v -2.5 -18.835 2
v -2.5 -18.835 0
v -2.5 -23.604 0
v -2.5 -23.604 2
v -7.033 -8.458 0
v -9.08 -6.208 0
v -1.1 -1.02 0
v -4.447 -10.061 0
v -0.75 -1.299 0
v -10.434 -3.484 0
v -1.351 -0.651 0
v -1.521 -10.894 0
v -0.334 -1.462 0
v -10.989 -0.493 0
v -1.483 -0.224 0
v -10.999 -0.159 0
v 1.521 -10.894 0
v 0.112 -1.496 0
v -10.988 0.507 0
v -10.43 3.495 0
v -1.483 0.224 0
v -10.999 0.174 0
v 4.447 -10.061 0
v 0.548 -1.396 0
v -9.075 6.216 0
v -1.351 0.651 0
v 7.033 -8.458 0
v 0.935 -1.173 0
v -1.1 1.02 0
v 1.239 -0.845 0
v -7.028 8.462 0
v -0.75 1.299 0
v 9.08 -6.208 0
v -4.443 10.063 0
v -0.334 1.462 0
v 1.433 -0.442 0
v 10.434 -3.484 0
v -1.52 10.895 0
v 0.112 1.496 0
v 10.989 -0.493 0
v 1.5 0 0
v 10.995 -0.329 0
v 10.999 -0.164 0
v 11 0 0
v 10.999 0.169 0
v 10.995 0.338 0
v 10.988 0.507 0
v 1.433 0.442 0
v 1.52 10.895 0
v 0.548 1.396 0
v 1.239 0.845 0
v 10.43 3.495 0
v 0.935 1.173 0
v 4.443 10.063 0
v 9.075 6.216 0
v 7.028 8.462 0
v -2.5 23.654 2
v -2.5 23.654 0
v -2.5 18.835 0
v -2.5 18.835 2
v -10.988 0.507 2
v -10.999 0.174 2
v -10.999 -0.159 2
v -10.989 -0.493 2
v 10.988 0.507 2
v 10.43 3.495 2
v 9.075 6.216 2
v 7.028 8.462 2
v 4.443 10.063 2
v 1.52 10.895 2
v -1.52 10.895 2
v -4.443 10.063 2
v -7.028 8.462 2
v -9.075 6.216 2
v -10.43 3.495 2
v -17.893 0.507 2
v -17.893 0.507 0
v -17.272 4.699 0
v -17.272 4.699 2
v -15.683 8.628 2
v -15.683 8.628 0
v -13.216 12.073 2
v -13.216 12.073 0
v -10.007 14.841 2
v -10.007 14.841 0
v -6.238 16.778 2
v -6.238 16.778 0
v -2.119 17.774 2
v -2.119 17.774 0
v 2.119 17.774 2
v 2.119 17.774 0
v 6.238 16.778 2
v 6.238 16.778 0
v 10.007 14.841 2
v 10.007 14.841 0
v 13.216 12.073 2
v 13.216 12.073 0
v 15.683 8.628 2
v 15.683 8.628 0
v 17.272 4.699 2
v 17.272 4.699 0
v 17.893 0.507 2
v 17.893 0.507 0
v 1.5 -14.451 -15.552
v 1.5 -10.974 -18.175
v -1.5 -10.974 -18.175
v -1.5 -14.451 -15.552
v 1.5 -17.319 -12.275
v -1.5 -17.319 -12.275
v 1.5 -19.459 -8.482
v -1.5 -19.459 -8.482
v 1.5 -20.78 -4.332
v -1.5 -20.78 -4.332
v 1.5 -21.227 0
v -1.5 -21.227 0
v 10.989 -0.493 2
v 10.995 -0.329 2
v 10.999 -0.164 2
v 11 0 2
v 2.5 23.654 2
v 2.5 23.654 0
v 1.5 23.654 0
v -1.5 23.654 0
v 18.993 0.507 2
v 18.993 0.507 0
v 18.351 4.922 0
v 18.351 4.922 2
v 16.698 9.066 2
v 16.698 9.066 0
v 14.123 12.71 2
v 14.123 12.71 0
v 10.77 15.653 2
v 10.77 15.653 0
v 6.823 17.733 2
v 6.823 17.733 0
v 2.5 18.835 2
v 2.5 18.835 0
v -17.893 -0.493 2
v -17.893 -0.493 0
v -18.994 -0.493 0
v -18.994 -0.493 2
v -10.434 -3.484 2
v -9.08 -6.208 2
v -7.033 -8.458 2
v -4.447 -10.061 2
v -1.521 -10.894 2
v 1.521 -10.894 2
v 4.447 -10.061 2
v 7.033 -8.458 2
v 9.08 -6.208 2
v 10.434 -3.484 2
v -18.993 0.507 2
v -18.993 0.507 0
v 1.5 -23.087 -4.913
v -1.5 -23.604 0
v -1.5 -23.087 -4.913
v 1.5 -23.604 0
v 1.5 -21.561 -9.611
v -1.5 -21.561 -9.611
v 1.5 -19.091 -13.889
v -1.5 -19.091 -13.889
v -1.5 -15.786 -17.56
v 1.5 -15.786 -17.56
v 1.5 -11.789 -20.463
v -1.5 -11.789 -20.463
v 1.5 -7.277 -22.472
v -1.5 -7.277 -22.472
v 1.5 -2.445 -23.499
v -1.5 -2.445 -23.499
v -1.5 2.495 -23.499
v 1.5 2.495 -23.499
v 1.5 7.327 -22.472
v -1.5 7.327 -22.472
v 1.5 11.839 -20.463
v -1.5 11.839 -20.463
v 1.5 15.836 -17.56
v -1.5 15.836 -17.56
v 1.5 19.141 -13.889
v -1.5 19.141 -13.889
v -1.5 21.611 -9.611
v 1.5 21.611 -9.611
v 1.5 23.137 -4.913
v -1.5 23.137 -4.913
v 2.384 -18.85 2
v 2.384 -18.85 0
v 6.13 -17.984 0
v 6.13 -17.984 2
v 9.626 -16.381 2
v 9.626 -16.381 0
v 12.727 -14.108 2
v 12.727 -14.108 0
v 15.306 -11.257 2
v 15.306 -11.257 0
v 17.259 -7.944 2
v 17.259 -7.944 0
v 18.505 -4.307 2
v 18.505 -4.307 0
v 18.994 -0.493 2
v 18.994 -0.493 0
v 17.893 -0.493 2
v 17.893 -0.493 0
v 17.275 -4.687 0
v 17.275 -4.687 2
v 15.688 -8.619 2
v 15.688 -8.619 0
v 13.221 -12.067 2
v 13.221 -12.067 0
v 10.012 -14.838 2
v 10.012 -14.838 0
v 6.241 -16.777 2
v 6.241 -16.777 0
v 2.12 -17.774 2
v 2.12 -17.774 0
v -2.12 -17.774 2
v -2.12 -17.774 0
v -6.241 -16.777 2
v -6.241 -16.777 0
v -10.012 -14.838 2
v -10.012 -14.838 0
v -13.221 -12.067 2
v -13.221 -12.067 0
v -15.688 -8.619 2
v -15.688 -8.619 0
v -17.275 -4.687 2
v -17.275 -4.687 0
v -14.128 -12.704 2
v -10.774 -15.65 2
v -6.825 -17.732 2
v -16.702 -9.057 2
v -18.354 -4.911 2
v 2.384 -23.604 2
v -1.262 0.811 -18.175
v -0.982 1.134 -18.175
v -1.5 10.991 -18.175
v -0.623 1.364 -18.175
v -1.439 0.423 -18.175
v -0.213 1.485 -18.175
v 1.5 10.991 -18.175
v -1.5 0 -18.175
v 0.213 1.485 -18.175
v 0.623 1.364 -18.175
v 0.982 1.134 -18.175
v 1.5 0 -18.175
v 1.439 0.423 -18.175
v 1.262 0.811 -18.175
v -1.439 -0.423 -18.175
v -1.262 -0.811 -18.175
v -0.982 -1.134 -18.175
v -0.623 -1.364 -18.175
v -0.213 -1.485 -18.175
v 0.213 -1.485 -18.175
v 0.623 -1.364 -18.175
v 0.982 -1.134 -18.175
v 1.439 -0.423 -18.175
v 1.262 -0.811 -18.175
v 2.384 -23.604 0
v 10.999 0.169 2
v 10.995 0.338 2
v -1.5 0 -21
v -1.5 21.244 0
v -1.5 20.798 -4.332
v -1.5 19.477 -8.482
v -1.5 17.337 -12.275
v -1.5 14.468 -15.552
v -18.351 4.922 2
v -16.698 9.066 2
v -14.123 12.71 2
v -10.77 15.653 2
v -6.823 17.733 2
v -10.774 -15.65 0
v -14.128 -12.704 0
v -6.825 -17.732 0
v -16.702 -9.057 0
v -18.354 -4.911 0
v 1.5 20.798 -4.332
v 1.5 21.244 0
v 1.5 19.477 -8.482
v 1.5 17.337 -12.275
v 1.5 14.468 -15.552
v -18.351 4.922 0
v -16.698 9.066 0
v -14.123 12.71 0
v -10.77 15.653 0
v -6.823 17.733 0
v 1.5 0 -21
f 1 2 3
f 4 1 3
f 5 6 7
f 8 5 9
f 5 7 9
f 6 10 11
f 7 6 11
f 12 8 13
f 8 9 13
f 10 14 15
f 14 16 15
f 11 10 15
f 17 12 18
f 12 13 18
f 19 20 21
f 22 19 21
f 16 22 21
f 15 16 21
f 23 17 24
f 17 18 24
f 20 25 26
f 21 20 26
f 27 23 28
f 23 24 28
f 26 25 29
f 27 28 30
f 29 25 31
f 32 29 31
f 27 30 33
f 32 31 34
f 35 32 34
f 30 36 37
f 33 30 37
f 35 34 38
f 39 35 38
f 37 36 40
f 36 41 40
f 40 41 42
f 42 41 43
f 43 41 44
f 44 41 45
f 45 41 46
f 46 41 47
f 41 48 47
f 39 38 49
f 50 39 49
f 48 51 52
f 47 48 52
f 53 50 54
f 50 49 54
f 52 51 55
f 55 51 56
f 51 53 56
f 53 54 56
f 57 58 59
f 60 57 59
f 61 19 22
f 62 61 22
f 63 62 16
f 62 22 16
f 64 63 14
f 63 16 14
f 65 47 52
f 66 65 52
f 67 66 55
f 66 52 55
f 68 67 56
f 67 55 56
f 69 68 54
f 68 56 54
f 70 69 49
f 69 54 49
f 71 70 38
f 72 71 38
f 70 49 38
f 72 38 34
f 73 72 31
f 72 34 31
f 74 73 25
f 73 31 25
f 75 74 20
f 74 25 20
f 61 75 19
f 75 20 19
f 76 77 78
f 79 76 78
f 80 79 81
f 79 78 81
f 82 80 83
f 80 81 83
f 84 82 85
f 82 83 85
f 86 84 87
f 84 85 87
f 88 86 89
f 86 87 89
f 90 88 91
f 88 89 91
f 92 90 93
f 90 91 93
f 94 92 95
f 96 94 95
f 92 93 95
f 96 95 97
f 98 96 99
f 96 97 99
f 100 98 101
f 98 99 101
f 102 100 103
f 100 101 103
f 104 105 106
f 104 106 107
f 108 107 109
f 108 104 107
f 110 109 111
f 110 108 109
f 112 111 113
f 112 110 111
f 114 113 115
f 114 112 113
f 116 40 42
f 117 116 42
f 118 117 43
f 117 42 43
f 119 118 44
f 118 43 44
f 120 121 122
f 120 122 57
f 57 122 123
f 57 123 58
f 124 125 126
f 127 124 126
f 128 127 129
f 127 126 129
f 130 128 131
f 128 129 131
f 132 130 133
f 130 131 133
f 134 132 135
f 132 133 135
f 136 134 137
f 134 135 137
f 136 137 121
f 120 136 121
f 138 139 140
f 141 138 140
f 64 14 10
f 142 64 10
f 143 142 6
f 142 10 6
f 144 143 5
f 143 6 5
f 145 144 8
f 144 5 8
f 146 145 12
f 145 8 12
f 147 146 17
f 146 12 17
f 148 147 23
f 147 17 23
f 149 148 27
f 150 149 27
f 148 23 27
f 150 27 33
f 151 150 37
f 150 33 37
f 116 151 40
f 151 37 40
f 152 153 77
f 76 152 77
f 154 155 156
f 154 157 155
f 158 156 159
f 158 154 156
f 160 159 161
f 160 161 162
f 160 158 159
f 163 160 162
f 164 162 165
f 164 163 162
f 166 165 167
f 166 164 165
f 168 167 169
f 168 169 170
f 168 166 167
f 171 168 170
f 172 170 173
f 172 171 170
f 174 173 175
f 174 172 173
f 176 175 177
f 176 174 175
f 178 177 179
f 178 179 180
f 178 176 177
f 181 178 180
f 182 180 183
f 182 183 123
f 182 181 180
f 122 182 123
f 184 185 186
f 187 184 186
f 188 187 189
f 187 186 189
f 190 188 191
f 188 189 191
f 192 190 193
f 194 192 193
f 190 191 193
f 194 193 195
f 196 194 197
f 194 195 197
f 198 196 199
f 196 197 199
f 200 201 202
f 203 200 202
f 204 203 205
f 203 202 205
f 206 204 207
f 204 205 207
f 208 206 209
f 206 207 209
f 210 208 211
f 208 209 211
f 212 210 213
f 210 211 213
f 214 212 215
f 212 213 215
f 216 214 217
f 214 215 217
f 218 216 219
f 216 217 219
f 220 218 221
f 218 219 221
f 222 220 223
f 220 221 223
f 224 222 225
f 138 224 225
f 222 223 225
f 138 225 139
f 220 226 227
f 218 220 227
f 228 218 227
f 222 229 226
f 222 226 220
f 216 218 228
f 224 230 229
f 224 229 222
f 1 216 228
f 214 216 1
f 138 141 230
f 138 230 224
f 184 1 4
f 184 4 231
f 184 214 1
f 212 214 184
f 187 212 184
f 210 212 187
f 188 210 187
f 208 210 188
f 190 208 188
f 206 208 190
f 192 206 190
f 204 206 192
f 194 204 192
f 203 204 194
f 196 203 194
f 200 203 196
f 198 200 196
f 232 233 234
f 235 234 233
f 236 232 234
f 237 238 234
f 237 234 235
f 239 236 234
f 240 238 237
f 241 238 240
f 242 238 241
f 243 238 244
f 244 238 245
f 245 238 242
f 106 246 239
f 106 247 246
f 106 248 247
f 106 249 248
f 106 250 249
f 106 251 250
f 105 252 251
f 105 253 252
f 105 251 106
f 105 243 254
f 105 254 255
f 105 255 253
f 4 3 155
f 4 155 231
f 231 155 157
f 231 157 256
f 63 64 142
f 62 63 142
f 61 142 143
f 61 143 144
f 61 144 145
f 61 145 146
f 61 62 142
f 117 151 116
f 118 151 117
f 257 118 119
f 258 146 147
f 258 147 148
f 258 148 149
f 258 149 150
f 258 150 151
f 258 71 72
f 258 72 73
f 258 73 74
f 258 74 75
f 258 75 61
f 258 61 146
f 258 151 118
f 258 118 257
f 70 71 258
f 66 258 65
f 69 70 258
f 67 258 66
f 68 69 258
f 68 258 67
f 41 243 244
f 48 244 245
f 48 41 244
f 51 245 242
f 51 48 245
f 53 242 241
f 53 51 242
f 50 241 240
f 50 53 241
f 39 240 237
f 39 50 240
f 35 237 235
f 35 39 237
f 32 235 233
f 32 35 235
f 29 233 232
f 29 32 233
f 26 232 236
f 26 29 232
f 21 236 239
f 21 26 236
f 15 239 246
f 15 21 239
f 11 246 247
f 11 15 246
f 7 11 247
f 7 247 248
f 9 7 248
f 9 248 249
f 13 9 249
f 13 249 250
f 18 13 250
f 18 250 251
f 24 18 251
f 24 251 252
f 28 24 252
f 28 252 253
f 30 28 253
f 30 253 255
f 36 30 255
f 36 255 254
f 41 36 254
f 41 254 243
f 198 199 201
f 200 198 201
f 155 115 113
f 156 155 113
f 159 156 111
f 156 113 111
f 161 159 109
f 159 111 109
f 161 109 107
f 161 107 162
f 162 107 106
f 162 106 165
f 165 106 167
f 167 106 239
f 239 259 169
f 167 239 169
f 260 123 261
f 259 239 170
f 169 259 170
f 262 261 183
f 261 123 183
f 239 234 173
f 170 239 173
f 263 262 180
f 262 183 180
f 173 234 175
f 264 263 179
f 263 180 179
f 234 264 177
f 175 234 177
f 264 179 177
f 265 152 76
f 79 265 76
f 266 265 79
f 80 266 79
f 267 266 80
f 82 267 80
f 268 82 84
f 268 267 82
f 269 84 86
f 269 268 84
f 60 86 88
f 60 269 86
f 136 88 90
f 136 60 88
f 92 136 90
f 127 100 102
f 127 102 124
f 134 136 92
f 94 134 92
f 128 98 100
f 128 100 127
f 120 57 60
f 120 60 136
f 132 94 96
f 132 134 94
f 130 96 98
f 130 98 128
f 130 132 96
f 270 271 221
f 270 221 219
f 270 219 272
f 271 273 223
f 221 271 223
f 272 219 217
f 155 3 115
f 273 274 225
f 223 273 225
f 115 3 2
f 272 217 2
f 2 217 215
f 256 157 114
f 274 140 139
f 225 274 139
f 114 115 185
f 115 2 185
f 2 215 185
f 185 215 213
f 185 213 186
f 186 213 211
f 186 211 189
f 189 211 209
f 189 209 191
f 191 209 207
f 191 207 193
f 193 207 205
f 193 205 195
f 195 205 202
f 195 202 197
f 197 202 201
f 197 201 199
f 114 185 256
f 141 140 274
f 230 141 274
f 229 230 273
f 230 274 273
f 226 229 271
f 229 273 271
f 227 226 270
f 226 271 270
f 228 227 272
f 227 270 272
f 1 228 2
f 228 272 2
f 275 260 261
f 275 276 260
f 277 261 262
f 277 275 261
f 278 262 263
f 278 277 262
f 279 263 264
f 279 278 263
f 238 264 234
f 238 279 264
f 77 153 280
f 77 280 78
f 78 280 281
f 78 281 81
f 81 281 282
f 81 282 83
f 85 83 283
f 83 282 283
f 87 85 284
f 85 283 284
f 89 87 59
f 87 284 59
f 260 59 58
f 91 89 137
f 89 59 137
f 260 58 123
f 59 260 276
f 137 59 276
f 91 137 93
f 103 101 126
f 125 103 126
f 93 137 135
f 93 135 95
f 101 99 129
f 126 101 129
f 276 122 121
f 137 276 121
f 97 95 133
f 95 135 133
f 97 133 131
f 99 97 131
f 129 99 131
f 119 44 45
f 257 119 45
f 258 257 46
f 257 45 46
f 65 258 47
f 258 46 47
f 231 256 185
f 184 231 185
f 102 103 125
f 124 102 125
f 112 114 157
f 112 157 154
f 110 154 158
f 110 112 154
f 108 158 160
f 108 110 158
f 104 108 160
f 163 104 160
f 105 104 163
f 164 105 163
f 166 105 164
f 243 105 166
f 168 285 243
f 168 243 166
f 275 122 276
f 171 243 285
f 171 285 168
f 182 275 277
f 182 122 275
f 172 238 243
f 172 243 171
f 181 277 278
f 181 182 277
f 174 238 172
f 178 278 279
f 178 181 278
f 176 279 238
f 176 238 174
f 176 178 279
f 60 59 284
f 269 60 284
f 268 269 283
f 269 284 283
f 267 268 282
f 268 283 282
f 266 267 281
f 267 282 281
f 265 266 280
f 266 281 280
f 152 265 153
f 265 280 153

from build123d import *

# Parameters (mm, degrees)
BOSS_EXTRUDE10_DEPTH = 2
BOSS_EXTRUDE11_DEPTH = 1.5
SKETCH8_R            = 1.5
BOSS_EXTRUDE12_DEPTH = 21


with BuildPart() as part:
    # Sketch1 → Boss-Extrude10 (new body)
    with BuildSketch(Plane.XY):
        with BuildLine():
            ThreePointArc((2.5, 18.834808202), (0, 19), (-2.5, 18.834808202))
            Line((-2.5, 18.834808202), (-2.5, 18.653696235))
            Line((-2.5, 18.653696235), (2.5, 18.653696235))
            Line((2.5, 18.653696235), (2.5, 18.834808202))
        make_face()
        with BuildLine():
            Line((-2.5, 23.653696235), (-2.5, 18.834808202))
            ThreePointArc((-2.5, 18.834808202), (0, 19), (2.5, 18.834808202))
            Line((2.5, 18.834808202), (2.5, 23.653696235))
            Line((2.5, 23.653696235), (-2.5, 23.653696235))
        make_face()
        with BuildLine():
            ThreePointArc((-2.5, 18.834808202), (-14.123191749, 12.709659901), (-18.993227641, 0.507251182))
            Line((-18.993227641, 0.507251182), (-17.892811301, 0.507251182))
            ThreePointArc((-17.892811301, 0.507251182), (0, 17.9), (17.892811301, 0.507251182))
            Line((17.892811301, 0.507251182), (18.993227641, 0.507251182))
            ThreePointArc((18.993227641, 0.507251182), (14.123191749, 12.709659901), (2.5, 18.834808202))
            Line((2.5, 18.834808202), (2.5, 18.653696235))
            Line((2.5, 18.653696235), (-2.5, 18.653696235))
            Line((-2.5, 18.653696235), (-2.5, 18.834808202))
        make_face()
        with BuildLine():
            Line((-17.893216553, -0.492748818), (-18.993609415, -0.492748818))
            ThreePointArc((-18.993609415, -0.492748818), (-14.12804293, -12.704267117), (-2.5, -18.834808202))
            Line((-2.5, -18.834808202), (-2.5, -18.60362099))
            Line((-2.5, -18.60362099), (2.384110391, -18.60362099))
            Line((2.384110391, -18.60362099), (2.384110391, -18.849828053))
            ThreePointArc((2.384110391, -18.849828053), (14.088907535, -12.747654077), (18.993609415, -0.492748818))
            Line((18.993609415, -0.492748818), (17.893216553, -0.492748818))
            ThreePointArc((17.893216553, -0.492748818), (0, -17.9), (-17.893216553, -0.492748818))
        make_face()
        with BuildLine():
            Line((10.988958031, -0.492748818), (-10.988958031, -0.492748818))
            ThreePointArc((-10.988958031, -0.492748818), (0, -11), (10.988958031, -0.492748818))
        make_face()
        with BuildLine():
            Line((10.98829815, 0.507251182), (-10.98829815, 0.507251182))
            ThreePointArc((-10.98829815, 0.507251182), (-10.999997605, 0.007258684), (-10.988958031, -0.492748818))
            Line((-10.988958031, -0.492748818), (10.988958031, -0.492748818))
            ThreePointArc((10.988958031, -0.492748818), (10.997239161, -0.246436261), (11, 0))
            ThreePointArc((11, 0), (10.997074148, 0.25369307), (10.98829815, 0.507251182))
        make_face()
        with BuildLine():
            ThreePointArc((10.98829815, 0.507251182), (0, 11), (-10.98829815, 0.507251182))
            Line((-10.98829815, 0.507251182), (10.98829815, 0.507251182))
        make_face()
        with BuildLine():
            ThreePointArc((2.384110391, -18.849828053), (-0.058429439, -18.999910158), (-2.5, -18.834808202))
            Line((-2.5, -18.834808202), (-2.5, -23.60362099))
            Line((-2.5, -23.60362099), (2.384110391, -23.60362099))
            Line((2.384110391, -23.60362099), (2.384110391, -18.849828053))
        make_face()
        with BuildLine():
            Line((-2.5, -18.60362099), (-2.5, -18.834808202))
            ThreePointArc((-2.5, -18.834808202), (-0.058429439, -18.999910158), (2.384110391, -18.849828053))
            Line((2.384110391, -18.849828053), (2.384110391, -18.60362099))
            Line((2.384110391, -18.60362099), (-2.5, -18.60362099))
        make_face()
    extrude(amount=BOSS_EXTRUDE10_DEPTH)

    # Sketch7 → Boss-Extrude11 (add, symmetric)
    with BuildSketch(Plane(origin=(0, 0, 0), x_dir=(0, 0, -1), z_dir=(1, 0, 0))):
        with BuildLine():
            ThreePointArc((0, 21.244252218), (21.23548837, 0.008763848), (0, -21.226724522))
            Line((0, -21.226724522), (0, -23.60362099))
            ThreePointArc((0, -23.60362099), (23.628658612, 0.025037622), (0, 23.653696235))
            Line((0, 23.653696235), (0, 21.244252218))
        make_face()
        with BuildLine():
            ThreePointArc((18.174866248, -10.973959092), (21.23548837, 0.008763848), (18.174866248, 10.991486788))
            Line((18.174866248, 10.991486788), (18.174866248, -10.973959092))
        make_face()
    extrude(amount=BOSS_EXTRUDE11_DEPTH, both=True)

    # Sketch8 → Boss-Extrude12 (add)
    with BuildSketch(Plane.XY):
        Circle(SKETCH8_R)
    extrude(amount=-BOSS_EXTRUDE12_DEPTH)


solid = part.part
